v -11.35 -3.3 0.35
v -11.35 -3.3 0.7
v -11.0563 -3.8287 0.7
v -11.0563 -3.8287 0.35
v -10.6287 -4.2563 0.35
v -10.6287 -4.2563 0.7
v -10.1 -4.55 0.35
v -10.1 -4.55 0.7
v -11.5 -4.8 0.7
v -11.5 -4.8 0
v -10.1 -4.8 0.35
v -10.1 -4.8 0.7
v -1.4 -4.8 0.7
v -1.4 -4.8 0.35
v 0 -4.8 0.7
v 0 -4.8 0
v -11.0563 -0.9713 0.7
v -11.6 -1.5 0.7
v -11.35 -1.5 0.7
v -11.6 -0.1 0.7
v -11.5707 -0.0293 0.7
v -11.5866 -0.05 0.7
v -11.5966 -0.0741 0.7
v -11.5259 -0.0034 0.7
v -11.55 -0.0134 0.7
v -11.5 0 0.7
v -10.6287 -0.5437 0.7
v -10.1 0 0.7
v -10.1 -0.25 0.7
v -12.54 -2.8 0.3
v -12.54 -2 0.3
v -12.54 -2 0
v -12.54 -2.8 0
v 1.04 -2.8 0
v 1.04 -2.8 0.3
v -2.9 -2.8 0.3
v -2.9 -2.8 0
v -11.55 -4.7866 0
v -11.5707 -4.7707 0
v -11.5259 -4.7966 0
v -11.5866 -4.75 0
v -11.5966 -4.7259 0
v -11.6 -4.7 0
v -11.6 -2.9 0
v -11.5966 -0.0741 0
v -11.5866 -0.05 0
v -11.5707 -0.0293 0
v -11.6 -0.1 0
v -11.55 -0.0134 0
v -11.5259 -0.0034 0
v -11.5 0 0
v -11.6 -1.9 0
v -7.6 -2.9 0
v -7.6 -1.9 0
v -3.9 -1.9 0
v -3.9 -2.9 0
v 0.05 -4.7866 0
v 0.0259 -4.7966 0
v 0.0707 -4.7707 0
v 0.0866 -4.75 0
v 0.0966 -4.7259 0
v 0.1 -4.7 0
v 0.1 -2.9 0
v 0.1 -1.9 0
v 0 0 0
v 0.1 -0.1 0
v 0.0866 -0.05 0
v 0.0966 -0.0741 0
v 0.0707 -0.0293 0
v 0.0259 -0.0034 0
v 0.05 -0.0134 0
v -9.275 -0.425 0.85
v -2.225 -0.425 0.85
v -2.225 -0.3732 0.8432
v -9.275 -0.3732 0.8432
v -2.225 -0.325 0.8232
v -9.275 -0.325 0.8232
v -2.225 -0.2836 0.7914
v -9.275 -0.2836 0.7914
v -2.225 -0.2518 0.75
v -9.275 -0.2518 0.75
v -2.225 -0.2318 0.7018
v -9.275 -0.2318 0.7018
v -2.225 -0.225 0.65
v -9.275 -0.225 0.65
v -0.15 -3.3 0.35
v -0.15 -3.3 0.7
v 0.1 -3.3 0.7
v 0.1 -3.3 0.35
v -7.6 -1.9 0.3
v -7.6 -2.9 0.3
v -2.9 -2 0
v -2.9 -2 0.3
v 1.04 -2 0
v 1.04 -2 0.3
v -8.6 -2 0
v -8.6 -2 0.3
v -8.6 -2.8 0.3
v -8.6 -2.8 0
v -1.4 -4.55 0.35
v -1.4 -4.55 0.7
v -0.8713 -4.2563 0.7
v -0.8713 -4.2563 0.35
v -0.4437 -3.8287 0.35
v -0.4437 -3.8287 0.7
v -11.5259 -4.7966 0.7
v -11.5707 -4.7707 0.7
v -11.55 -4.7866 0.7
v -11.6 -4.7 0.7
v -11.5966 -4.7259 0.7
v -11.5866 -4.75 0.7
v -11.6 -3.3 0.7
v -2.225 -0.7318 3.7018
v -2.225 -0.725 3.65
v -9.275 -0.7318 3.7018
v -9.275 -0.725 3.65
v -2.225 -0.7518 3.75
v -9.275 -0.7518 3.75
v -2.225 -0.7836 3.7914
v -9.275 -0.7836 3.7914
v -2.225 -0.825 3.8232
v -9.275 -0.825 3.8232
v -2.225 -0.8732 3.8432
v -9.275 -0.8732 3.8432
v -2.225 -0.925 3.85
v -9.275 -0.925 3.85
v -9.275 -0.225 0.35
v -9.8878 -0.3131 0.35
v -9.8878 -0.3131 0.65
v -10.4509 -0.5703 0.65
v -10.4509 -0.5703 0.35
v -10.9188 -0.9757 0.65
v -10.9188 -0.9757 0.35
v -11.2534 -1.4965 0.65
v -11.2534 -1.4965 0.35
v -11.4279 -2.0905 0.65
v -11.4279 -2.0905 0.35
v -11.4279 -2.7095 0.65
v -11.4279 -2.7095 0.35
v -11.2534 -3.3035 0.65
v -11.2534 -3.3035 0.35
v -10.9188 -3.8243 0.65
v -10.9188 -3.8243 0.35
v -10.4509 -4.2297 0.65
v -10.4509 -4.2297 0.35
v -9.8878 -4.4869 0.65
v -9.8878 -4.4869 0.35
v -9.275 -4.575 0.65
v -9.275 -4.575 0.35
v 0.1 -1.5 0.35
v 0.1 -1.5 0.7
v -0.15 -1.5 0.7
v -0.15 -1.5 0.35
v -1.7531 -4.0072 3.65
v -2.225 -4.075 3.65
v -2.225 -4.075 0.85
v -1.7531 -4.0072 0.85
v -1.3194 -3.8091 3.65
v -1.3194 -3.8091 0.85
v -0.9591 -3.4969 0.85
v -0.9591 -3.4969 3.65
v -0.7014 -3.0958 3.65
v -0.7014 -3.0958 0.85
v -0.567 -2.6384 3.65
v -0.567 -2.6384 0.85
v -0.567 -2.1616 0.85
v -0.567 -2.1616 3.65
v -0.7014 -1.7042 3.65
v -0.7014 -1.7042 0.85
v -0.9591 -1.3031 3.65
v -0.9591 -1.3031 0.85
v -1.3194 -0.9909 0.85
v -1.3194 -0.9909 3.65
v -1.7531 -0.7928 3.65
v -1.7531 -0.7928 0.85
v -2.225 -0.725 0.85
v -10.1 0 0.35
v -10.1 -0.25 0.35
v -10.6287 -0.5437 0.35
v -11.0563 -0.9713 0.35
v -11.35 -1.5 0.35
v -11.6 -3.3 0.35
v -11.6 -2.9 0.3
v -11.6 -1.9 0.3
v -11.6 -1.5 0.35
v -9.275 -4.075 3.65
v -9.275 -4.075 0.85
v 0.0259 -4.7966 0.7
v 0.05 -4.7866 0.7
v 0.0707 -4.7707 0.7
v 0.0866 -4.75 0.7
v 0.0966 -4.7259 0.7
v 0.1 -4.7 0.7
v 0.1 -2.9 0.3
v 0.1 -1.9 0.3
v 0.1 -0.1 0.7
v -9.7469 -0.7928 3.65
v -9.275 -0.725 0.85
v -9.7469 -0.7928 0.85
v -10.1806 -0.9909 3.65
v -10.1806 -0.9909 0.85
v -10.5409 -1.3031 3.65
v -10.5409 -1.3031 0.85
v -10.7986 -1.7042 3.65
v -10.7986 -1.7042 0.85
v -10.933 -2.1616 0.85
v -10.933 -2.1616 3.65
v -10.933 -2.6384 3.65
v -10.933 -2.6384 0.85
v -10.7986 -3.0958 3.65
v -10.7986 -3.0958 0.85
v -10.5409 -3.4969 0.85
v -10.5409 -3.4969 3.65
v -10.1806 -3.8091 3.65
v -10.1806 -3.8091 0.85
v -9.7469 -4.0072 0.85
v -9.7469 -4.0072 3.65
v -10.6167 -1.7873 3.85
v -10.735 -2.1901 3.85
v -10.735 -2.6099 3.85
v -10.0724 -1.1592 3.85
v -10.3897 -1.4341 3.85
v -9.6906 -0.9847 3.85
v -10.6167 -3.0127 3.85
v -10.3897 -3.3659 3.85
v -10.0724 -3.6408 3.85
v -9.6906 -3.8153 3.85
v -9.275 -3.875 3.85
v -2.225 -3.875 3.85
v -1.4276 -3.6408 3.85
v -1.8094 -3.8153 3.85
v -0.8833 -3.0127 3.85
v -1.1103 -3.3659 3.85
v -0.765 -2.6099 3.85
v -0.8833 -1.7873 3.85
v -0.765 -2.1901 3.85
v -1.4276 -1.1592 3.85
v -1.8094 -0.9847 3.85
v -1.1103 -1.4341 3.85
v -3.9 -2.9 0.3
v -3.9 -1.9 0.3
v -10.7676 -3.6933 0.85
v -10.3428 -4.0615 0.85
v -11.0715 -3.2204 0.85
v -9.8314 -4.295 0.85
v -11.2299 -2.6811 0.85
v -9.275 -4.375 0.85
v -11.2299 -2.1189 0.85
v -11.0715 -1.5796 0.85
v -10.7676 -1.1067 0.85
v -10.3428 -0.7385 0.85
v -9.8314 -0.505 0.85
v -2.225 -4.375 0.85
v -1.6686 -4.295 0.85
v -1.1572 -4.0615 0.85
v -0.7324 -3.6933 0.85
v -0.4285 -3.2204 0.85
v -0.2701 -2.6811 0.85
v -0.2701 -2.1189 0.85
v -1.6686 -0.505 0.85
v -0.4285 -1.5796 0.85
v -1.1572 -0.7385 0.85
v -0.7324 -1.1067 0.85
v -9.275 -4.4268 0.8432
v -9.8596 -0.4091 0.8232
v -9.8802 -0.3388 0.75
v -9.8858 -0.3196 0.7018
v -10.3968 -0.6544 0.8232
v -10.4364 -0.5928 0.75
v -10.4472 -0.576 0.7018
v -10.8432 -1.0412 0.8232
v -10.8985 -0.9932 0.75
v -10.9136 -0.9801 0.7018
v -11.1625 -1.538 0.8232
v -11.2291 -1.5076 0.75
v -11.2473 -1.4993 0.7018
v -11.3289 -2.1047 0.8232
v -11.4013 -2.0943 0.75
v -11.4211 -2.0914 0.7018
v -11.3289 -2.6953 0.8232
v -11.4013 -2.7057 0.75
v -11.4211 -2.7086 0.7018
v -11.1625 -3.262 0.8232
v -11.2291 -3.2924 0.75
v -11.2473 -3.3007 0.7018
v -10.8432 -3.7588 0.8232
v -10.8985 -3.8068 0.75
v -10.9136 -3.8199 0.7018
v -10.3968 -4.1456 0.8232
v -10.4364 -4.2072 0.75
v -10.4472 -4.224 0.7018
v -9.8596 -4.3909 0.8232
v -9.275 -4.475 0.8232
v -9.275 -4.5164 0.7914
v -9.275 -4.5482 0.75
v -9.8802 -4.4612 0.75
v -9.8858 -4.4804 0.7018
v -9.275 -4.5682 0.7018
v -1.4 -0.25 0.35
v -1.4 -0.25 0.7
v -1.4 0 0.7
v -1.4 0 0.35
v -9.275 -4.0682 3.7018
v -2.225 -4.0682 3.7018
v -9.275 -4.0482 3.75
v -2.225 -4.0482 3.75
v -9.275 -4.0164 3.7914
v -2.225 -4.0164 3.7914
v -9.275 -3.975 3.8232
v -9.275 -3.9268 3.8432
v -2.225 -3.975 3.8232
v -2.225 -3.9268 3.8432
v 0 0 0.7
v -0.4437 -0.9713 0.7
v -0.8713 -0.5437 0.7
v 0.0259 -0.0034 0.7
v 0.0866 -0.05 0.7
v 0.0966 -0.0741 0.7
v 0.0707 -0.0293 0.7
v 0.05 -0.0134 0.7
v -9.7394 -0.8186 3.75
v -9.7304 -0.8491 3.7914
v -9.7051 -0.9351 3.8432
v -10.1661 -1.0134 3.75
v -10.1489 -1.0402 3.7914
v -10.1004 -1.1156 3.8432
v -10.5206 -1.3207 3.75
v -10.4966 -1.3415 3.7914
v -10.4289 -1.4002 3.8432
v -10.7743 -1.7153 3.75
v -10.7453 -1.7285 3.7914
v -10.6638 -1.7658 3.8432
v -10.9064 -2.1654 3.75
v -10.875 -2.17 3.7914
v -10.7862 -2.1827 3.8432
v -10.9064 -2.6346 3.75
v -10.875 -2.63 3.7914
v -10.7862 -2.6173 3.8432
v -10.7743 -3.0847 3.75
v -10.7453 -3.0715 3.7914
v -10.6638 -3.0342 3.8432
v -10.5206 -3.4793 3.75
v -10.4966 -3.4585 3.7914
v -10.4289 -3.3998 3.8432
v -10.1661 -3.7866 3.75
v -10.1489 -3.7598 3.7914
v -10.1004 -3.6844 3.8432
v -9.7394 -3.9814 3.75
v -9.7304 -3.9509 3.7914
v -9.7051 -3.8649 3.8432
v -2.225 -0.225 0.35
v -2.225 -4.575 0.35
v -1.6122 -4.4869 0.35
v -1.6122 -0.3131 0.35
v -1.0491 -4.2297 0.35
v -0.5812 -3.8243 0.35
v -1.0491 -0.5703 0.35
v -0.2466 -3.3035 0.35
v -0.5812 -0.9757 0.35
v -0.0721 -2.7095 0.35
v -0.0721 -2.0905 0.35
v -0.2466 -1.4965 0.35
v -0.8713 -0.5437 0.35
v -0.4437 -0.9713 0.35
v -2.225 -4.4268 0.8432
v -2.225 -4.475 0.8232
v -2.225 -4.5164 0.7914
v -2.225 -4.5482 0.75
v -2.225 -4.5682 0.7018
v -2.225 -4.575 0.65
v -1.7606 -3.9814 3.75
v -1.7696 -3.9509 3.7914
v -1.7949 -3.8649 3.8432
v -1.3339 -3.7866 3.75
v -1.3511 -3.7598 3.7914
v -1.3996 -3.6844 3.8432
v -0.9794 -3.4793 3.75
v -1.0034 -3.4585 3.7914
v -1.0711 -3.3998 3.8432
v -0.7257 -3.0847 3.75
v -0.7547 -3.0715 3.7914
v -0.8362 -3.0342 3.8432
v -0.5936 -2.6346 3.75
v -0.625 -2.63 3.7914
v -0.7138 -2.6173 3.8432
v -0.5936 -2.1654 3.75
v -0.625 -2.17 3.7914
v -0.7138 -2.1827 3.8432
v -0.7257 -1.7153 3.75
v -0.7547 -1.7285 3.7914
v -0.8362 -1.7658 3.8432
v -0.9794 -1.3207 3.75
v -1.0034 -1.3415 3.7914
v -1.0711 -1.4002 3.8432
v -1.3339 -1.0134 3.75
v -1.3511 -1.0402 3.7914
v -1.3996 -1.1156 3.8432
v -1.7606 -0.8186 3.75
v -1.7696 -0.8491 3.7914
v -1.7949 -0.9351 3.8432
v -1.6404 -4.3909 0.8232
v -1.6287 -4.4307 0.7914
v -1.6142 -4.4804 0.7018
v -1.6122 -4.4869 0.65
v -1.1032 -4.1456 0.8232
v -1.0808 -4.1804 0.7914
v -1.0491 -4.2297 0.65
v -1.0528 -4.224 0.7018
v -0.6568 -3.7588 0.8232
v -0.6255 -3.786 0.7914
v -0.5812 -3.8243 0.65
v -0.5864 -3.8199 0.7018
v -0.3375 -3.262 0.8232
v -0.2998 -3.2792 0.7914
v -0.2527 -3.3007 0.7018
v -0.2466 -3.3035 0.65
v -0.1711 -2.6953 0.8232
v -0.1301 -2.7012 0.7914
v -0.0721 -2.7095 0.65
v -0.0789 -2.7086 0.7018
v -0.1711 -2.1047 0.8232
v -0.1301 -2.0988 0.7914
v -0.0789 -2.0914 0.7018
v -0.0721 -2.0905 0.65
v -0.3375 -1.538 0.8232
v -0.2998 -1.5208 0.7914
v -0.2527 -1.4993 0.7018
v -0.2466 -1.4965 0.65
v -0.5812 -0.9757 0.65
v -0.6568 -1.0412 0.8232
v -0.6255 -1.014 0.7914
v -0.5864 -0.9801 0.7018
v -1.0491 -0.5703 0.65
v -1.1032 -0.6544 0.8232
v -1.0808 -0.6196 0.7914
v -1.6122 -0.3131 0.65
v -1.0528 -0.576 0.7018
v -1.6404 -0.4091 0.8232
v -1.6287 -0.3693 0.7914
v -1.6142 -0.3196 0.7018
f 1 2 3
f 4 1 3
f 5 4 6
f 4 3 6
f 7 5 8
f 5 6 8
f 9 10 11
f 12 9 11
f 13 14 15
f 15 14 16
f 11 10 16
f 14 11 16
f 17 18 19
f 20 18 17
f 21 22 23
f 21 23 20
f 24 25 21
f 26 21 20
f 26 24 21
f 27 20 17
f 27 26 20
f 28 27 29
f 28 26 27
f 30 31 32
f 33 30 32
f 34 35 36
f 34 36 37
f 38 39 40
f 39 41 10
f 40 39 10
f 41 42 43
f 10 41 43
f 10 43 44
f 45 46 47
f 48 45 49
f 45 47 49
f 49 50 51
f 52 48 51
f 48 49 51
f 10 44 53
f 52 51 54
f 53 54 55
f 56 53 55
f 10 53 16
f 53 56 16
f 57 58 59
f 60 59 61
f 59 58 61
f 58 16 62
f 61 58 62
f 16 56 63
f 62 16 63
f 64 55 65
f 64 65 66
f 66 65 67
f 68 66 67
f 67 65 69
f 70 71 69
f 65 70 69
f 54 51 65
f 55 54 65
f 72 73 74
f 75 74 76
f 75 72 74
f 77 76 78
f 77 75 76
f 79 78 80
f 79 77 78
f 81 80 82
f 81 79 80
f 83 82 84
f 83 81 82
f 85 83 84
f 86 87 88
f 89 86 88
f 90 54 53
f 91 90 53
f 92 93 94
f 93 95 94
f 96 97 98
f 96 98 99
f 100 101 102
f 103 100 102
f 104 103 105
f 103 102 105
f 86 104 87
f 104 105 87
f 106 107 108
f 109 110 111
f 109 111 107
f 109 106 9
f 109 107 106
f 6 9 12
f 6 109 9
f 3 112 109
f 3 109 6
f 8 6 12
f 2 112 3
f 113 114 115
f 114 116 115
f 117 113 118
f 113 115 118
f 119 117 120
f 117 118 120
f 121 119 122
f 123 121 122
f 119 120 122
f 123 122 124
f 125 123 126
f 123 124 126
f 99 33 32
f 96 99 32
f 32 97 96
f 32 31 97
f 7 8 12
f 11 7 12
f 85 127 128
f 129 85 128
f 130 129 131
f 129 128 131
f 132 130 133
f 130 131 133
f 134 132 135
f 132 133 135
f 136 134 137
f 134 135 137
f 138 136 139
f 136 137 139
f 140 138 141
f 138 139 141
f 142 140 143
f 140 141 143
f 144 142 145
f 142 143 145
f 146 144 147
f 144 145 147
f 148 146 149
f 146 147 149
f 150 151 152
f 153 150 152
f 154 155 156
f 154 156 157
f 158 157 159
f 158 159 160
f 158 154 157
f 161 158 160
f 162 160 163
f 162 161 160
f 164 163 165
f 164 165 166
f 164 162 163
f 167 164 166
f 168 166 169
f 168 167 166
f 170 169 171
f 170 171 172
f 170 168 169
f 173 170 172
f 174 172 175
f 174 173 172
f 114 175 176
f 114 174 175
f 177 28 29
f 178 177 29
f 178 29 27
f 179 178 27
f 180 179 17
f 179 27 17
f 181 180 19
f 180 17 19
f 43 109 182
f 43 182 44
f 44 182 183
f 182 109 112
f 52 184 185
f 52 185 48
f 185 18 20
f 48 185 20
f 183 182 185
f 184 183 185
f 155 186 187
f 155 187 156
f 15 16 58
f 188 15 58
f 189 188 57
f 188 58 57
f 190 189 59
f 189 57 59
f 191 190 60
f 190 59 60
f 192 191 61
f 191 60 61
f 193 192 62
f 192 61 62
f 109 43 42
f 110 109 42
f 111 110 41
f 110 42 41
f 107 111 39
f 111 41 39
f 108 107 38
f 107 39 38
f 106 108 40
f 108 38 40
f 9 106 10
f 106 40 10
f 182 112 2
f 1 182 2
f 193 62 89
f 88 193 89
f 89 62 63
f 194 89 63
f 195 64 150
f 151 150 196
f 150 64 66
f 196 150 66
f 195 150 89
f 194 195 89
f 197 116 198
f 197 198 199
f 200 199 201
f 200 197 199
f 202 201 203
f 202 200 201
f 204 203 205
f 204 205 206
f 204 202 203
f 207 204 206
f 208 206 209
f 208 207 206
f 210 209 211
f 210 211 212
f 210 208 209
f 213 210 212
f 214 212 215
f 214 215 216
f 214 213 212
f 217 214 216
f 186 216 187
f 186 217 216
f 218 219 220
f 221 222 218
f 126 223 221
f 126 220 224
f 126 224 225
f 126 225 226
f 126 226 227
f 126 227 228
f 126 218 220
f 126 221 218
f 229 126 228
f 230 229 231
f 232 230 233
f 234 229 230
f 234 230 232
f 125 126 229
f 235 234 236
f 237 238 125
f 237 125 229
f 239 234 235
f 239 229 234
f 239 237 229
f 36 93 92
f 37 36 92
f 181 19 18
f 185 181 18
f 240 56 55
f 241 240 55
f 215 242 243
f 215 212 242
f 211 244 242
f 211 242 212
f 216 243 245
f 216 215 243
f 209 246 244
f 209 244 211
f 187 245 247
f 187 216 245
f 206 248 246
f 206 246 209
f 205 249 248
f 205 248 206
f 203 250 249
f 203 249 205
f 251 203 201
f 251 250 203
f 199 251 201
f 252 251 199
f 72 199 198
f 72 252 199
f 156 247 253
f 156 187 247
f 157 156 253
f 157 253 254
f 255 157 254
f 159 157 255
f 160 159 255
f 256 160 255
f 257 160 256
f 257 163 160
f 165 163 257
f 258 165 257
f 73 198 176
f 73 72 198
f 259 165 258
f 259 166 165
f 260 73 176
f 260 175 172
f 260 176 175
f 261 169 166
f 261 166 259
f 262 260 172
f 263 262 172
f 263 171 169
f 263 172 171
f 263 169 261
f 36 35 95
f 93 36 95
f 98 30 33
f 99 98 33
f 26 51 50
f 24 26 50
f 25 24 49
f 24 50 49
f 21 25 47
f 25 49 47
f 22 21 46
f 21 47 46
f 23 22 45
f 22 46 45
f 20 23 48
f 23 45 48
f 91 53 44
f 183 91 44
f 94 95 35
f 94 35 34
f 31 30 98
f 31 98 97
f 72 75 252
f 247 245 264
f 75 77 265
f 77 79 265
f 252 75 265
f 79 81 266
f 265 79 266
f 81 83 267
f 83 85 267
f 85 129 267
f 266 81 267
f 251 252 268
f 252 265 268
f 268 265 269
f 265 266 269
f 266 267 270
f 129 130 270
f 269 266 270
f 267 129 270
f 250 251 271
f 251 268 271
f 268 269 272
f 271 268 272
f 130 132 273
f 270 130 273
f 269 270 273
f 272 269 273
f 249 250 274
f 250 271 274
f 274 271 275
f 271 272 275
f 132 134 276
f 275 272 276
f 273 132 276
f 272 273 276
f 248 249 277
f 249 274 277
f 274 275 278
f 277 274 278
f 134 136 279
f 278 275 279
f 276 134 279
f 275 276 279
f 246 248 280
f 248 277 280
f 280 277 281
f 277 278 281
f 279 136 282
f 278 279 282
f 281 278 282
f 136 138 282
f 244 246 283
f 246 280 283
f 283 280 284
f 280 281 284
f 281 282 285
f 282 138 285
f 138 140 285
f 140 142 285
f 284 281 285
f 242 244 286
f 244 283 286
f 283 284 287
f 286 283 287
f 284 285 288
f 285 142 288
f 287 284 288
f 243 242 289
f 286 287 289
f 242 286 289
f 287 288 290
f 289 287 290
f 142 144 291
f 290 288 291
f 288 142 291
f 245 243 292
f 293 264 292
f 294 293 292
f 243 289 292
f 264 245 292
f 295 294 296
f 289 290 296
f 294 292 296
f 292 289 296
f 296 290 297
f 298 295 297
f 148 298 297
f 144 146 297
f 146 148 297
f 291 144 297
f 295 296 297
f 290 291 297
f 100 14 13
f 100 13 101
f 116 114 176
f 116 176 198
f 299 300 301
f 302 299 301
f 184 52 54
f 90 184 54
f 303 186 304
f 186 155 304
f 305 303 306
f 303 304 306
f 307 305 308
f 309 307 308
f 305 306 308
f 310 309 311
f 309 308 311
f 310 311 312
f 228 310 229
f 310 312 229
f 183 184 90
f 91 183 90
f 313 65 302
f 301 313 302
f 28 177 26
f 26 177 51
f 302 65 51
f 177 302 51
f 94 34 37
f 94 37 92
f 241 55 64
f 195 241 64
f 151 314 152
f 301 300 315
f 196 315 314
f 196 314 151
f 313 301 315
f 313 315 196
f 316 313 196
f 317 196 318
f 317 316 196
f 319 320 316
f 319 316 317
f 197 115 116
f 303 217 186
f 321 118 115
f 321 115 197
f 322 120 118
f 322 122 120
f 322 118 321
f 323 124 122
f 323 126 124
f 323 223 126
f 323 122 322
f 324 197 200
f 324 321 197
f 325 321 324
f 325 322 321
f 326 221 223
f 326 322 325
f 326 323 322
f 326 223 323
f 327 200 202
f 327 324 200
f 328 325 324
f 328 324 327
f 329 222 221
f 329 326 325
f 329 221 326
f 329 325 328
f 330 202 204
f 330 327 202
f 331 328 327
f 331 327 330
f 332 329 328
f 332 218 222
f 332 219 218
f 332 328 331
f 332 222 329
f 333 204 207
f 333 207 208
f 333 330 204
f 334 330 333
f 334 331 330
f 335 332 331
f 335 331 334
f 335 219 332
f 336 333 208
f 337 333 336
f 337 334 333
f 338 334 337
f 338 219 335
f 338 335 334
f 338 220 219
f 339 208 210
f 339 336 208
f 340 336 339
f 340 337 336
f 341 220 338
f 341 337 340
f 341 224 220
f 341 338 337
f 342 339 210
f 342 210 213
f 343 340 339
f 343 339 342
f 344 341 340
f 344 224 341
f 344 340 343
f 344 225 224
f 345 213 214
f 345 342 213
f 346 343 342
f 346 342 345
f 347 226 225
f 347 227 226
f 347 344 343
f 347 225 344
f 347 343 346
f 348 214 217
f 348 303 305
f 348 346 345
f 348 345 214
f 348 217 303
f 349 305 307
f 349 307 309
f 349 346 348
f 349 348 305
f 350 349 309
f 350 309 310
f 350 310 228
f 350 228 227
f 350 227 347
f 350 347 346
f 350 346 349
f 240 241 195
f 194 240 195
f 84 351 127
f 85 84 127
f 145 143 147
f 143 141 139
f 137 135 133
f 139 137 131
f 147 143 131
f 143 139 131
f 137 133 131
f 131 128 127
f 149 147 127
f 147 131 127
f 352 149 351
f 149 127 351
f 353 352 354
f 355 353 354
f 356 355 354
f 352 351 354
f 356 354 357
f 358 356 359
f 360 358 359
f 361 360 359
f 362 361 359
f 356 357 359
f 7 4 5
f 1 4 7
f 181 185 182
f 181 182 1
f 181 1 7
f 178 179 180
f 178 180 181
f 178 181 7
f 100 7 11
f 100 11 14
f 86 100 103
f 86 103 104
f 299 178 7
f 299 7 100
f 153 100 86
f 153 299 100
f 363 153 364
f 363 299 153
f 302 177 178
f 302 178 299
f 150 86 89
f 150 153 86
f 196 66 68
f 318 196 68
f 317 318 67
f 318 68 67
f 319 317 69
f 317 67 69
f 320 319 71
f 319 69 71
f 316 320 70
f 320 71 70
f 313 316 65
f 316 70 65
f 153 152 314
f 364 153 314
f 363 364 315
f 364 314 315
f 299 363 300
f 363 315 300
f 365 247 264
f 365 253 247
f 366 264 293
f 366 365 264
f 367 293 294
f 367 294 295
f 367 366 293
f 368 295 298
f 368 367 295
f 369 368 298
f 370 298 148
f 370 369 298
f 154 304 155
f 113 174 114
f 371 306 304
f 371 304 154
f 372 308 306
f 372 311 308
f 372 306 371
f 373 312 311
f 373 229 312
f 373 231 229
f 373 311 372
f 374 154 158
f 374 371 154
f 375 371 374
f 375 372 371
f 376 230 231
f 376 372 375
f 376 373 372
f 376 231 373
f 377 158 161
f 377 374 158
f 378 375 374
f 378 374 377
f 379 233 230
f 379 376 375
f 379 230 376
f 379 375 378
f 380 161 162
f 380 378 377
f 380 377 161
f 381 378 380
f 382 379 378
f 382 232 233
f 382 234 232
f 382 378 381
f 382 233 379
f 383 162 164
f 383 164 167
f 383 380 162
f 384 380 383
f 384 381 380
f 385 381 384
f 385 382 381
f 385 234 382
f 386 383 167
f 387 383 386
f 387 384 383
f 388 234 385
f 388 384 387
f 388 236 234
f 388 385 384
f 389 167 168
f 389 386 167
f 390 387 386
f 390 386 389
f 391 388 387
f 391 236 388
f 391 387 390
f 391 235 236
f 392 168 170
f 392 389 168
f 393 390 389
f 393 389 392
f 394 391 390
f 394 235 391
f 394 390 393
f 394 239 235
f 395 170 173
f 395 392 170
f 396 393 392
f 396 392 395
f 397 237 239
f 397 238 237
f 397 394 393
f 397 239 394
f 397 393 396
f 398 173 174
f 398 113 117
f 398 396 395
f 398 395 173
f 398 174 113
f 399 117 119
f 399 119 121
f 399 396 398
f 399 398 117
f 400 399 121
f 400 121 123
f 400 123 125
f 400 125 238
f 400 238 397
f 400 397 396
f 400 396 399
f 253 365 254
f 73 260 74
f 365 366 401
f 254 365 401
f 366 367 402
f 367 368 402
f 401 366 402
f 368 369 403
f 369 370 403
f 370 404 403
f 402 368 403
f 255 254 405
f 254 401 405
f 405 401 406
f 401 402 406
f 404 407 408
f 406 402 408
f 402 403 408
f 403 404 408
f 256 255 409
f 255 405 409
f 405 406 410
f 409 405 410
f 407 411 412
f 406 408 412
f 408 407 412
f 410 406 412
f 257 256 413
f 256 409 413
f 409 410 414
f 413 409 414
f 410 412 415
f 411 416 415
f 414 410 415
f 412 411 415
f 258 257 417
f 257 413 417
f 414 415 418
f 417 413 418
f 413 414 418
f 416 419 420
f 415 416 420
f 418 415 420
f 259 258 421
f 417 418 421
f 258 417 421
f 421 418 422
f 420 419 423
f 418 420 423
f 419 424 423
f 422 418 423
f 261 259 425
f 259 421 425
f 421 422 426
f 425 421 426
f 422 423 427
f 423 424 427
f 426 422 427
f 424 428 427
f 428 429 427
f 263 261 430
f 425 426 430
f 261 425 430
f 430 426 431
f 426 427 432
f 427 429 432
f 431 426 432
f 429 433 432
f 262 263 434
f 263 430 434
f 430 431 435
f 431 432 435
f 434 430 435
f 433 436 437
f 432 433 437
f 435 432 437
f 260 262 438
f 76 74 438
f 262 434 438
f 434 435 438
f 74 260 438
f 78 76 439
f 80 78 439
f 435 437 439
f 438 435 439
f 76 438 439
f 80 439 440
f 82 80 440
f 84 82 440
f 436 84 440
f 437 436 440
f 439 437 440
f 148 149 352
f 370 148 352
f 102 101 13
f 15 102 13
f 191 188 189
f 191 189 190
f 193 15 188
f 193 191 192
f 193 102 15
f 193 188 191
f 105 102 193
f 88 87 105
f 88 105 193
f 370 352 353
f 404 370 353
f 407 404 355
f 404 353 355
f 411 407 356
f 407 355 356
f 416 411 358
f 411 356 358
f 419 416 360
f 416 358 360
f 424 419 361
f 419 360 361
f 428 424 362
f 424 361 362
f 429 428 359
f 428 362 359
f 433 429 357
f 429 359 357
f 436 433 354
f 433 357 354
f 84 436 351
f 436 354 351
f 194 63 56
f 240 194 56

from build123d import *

# Parameters (mm, degrees)
DODANIE_WYCI_GNI_CIE1_DEPTH      = 0.7
SZKIC2_W                         = 4
SZKIC2_H                         = 1
DODANIE_WYCI_GNI_CIE2_DEPTH      = 0.4
WYTNIJ_WYCI_GNI_CIE1_DEPTH       = 0.35
DODANIE_WYCI_GNI_CIE3_DEPTH      = 3.5
SZKIC5_OUTSIDE_W                 = 16.344
SZKIC5_OUTSIDE_H                 = 9.444
WYTNIJ_WYCI_GNI_CIE2_DEPTH       = 3
ZAOKR_GLENIE1_R                  = 0.2
ZAOKR_GLENIE2_R                  = 0.2
SZKIC6_W                         = 0.3
SZKIC6_H                         = 0.8
DODANIE_WYCI_GNI_CIE4_DEPTH      = 0.94
DODANIE_WYCI_GNI_CIE4_DEPTH_BACK = 3


with BuildPart() as part:
    # Szkic1 → Dodanie-wyciągnięcie1 (new body)
    with BuildSketch(Plane.XY):
        with BuildLine():
            Line((0, 0), (-11.5, 0))
            ThreePointArc((-11.5, 0), (-11.570710678, -0.029289322), (-11.6, -0.1))
            Line((-11.6, -0.1), (-11.6, -1.9))
            Line((-11.6, -1.9), (-7.6, -1.9))
            Line((-7.6, -1.9), (-7.6, -2.9))
            Line((-7.6, -2.9), (-11.6, -2.9))
            Line((-11.6, -2.9), (-11.6, -4.7))
            ThreePointArc((-11.6, -4.7), (-11.570710678, -4.770710678), (-11.5, -4.8))
            Line((-11.5, -4.8), (0, -4.8))
            ThreePointArc((0, -4.8), (0.070710678, -4.770710678), (0.1, -4.7))
            Line((0.1, -4.7), (0.1, -2.9))
            Line((0.1, -2.9), (-3.9, -2.9))
            Line((-3.9, -2.9), (-3.9, -1.9))
            Line((-3.9, -1.9), (0.1, -1.9))
            Line((0.1, -1.9), (0.1, -0.1))
            ThreePointArc((0.1, -0.1), (0.070710678, -0.029289322), (0, 0))
        make_face()
    extrude(amount=DODANIE_WYCI_GNI_CIE1_DEPTH)

    # Szkic2 → Dodanie-wyciągnięcie2 (add)
    with BuildSketch(Plane.XY.offset(0.7)):
        with Locations((-9.6, -2.4)):
            Rectangle(SZKIC2_W, SZKIC2_H)
        with Locations((-1.9, -2.4)):
            Rectangle(SZKIC2_W, SZKIC2_H)
    extrude(amount=-DODANIE_WYCI_GNI_CIE2_DEPTH)

    # Szkic3 → Wytnij-wyciągnięcie1 (cut)
    with BuildSketch(Plane.XY.offset(0.7)):
        with BuildLine():
            Line((-1.4, -0.25), (-1.4, 0))
            Line((-1.4, 0), (-10.1, 0))
            Line((-10.1, 0), (-10.1, -0.25))
            ThreePointArc((-10.1, -0.25), (-10.857388458, -0.742611542), (-11.35, -1.5))
            Line((-11.35, -1.5), (-11.6, -1.5))
            Line((-11.6, -1.5), (-11.6, -3.3))
            Line((-11.6, -3.3), (-11.35, -3.3))
            ThreePointArc((-11.35, -3.3), (-10.857388458, -4.057388458), (-10.1, -4.55))
            Line((-10.1, -4.55), (-10.1, -4.8))
            Line((-10.1, -4.8), (-1.4, -4.8))
            Line((-1.4, -4.8), (-1.4, -4.55))
            ThreePointArc((-1.4, -4.55), (-0.642611542, -4.057388458), (-0.15, -3.3))
            Line((-0.15, -3.3), (0.1, -3.3))
            Line((0.1, -3.3), (0.1, -1.5))
            Line((0.1, -1.5), (-0.15, -1.5))
            ThreePointArc((-0.15, -1.5), (-0.642611542, -0.742611542), (-1.4, -0.25))
        make_face()
    extrude(amount=-WYTNIJ_WYCI_GNI_CIE1_DEPTH, mode=Mode.SUBTRACT)


with BuildPart() as body_2:
    # Szkic4 → Dodanie-wyciągnięcie3 (new body)
    with BuildSketch(Plane.XY.offset(0.35)):
        with BuildLine():
            Line((-2.225, -0.225), (-9.275, -0.225))
            ThreePointArc((-9.275, -0.225), (-11.45, -2.4), (-9.275, -4.575))
            Line((-9.275, -4.575), (-2.225, -4.575))
            ThreePointArc((-2.225, -4.575), (-0.05, -2.4), (-2.225, -0.225))
        make_face()
    extrude(amount=DODANIE_WYCI_GNI_CIE3_DEPTH)

    # Szkic5 outside → Wytnij-wyciągnięcie2 (cut)
    with BuildSketch(Plane.XY.offset(3.85)):
        with Locations((-5.75, -2.4)):
            Rectangle(SZKIC5_OUTSIDE_W, SZKIC5_OUTSIDE_H)
        with BuildLine():
            Line((-2.225, -0.725), (-9.275, -0.725))
            ThreePointArc((-9.275, -0.725), (-10.95, -2.4), (-9.275, -4.075))
            Line((-9.275, -4.075), (-2.225, -4.075))
            ThreePointArc((-2.225, -4.075), (-0.55, -2.4), (-2.225, -0.725))
        make_face(mode=Mode.SUBTRACT)
    extrude(amount=-WYTNIJ_WYCI_GNI_CIE2_DEPTH, mode=Mode.SUBTRACT)

    # Zaokrąglenie1
    zaokr_glenie1_edges = [body_2.edges().sort_by_distance(p)[0] for p in [
        (-0.55, -2.4, 3.85),
        (-5.75, -4.075, 3.85),
        (-10.95, -2.4, 3.85),
        (-5.75, -0.725, 3.85),
    ]]
    fillet(zaokr_glenie1_edges, radius=ZAOKR_GLENIE1_R)

    # Zaokrąglenie2
    zaokr_glenie2_edges = [body_2.edges().sort_by_distance(p)[0] for p in [
        (-5.75, -4.575, 0.85),
        (-0.05, -2.4, 0.85),
        (-5.75, -0.225, 0.85),
        (-11.45, -2.4, 0.85),
    ]]
    fillet(zaokr_glenie2_edges, radius=ZAOKR_GLENIE2_R)


with BuildPart() as body_3:
    # Szkic6 → Dodanie-wyciągnięcie4 (new body, two sides)
    with BuildSketch(Plane(origin=(0.1, 0, 0), x_dir=(0, 0, -1), z_dir=(1, 0, 0))) as dodanie_wyci_gni_cie4_sk:
        with Locations((-0.15, -2.4)):
            Rectangle(SZKIC6_W, SZKIC6_H)
    extrude(amount=DODANIE_WYCI_GNI_CIE4_DEPTH)
    extrude(dodanie_wyci_gni_cie4_sk.sketch, amount=-DODANIE_WYCI_GNI_CIE4_DEPTH_BACK)


with BuildPart() as body_4:
    # Lustro1: mirrored copy
    add(body_3.part.mirror(Plane(origin=(-5.75, 0, 0), x_dir=(0, 0, 1), z_dir=(1, 0, 0))))


solid = Compound([part.part, body_2.part, body_3.part, body_4.part])
